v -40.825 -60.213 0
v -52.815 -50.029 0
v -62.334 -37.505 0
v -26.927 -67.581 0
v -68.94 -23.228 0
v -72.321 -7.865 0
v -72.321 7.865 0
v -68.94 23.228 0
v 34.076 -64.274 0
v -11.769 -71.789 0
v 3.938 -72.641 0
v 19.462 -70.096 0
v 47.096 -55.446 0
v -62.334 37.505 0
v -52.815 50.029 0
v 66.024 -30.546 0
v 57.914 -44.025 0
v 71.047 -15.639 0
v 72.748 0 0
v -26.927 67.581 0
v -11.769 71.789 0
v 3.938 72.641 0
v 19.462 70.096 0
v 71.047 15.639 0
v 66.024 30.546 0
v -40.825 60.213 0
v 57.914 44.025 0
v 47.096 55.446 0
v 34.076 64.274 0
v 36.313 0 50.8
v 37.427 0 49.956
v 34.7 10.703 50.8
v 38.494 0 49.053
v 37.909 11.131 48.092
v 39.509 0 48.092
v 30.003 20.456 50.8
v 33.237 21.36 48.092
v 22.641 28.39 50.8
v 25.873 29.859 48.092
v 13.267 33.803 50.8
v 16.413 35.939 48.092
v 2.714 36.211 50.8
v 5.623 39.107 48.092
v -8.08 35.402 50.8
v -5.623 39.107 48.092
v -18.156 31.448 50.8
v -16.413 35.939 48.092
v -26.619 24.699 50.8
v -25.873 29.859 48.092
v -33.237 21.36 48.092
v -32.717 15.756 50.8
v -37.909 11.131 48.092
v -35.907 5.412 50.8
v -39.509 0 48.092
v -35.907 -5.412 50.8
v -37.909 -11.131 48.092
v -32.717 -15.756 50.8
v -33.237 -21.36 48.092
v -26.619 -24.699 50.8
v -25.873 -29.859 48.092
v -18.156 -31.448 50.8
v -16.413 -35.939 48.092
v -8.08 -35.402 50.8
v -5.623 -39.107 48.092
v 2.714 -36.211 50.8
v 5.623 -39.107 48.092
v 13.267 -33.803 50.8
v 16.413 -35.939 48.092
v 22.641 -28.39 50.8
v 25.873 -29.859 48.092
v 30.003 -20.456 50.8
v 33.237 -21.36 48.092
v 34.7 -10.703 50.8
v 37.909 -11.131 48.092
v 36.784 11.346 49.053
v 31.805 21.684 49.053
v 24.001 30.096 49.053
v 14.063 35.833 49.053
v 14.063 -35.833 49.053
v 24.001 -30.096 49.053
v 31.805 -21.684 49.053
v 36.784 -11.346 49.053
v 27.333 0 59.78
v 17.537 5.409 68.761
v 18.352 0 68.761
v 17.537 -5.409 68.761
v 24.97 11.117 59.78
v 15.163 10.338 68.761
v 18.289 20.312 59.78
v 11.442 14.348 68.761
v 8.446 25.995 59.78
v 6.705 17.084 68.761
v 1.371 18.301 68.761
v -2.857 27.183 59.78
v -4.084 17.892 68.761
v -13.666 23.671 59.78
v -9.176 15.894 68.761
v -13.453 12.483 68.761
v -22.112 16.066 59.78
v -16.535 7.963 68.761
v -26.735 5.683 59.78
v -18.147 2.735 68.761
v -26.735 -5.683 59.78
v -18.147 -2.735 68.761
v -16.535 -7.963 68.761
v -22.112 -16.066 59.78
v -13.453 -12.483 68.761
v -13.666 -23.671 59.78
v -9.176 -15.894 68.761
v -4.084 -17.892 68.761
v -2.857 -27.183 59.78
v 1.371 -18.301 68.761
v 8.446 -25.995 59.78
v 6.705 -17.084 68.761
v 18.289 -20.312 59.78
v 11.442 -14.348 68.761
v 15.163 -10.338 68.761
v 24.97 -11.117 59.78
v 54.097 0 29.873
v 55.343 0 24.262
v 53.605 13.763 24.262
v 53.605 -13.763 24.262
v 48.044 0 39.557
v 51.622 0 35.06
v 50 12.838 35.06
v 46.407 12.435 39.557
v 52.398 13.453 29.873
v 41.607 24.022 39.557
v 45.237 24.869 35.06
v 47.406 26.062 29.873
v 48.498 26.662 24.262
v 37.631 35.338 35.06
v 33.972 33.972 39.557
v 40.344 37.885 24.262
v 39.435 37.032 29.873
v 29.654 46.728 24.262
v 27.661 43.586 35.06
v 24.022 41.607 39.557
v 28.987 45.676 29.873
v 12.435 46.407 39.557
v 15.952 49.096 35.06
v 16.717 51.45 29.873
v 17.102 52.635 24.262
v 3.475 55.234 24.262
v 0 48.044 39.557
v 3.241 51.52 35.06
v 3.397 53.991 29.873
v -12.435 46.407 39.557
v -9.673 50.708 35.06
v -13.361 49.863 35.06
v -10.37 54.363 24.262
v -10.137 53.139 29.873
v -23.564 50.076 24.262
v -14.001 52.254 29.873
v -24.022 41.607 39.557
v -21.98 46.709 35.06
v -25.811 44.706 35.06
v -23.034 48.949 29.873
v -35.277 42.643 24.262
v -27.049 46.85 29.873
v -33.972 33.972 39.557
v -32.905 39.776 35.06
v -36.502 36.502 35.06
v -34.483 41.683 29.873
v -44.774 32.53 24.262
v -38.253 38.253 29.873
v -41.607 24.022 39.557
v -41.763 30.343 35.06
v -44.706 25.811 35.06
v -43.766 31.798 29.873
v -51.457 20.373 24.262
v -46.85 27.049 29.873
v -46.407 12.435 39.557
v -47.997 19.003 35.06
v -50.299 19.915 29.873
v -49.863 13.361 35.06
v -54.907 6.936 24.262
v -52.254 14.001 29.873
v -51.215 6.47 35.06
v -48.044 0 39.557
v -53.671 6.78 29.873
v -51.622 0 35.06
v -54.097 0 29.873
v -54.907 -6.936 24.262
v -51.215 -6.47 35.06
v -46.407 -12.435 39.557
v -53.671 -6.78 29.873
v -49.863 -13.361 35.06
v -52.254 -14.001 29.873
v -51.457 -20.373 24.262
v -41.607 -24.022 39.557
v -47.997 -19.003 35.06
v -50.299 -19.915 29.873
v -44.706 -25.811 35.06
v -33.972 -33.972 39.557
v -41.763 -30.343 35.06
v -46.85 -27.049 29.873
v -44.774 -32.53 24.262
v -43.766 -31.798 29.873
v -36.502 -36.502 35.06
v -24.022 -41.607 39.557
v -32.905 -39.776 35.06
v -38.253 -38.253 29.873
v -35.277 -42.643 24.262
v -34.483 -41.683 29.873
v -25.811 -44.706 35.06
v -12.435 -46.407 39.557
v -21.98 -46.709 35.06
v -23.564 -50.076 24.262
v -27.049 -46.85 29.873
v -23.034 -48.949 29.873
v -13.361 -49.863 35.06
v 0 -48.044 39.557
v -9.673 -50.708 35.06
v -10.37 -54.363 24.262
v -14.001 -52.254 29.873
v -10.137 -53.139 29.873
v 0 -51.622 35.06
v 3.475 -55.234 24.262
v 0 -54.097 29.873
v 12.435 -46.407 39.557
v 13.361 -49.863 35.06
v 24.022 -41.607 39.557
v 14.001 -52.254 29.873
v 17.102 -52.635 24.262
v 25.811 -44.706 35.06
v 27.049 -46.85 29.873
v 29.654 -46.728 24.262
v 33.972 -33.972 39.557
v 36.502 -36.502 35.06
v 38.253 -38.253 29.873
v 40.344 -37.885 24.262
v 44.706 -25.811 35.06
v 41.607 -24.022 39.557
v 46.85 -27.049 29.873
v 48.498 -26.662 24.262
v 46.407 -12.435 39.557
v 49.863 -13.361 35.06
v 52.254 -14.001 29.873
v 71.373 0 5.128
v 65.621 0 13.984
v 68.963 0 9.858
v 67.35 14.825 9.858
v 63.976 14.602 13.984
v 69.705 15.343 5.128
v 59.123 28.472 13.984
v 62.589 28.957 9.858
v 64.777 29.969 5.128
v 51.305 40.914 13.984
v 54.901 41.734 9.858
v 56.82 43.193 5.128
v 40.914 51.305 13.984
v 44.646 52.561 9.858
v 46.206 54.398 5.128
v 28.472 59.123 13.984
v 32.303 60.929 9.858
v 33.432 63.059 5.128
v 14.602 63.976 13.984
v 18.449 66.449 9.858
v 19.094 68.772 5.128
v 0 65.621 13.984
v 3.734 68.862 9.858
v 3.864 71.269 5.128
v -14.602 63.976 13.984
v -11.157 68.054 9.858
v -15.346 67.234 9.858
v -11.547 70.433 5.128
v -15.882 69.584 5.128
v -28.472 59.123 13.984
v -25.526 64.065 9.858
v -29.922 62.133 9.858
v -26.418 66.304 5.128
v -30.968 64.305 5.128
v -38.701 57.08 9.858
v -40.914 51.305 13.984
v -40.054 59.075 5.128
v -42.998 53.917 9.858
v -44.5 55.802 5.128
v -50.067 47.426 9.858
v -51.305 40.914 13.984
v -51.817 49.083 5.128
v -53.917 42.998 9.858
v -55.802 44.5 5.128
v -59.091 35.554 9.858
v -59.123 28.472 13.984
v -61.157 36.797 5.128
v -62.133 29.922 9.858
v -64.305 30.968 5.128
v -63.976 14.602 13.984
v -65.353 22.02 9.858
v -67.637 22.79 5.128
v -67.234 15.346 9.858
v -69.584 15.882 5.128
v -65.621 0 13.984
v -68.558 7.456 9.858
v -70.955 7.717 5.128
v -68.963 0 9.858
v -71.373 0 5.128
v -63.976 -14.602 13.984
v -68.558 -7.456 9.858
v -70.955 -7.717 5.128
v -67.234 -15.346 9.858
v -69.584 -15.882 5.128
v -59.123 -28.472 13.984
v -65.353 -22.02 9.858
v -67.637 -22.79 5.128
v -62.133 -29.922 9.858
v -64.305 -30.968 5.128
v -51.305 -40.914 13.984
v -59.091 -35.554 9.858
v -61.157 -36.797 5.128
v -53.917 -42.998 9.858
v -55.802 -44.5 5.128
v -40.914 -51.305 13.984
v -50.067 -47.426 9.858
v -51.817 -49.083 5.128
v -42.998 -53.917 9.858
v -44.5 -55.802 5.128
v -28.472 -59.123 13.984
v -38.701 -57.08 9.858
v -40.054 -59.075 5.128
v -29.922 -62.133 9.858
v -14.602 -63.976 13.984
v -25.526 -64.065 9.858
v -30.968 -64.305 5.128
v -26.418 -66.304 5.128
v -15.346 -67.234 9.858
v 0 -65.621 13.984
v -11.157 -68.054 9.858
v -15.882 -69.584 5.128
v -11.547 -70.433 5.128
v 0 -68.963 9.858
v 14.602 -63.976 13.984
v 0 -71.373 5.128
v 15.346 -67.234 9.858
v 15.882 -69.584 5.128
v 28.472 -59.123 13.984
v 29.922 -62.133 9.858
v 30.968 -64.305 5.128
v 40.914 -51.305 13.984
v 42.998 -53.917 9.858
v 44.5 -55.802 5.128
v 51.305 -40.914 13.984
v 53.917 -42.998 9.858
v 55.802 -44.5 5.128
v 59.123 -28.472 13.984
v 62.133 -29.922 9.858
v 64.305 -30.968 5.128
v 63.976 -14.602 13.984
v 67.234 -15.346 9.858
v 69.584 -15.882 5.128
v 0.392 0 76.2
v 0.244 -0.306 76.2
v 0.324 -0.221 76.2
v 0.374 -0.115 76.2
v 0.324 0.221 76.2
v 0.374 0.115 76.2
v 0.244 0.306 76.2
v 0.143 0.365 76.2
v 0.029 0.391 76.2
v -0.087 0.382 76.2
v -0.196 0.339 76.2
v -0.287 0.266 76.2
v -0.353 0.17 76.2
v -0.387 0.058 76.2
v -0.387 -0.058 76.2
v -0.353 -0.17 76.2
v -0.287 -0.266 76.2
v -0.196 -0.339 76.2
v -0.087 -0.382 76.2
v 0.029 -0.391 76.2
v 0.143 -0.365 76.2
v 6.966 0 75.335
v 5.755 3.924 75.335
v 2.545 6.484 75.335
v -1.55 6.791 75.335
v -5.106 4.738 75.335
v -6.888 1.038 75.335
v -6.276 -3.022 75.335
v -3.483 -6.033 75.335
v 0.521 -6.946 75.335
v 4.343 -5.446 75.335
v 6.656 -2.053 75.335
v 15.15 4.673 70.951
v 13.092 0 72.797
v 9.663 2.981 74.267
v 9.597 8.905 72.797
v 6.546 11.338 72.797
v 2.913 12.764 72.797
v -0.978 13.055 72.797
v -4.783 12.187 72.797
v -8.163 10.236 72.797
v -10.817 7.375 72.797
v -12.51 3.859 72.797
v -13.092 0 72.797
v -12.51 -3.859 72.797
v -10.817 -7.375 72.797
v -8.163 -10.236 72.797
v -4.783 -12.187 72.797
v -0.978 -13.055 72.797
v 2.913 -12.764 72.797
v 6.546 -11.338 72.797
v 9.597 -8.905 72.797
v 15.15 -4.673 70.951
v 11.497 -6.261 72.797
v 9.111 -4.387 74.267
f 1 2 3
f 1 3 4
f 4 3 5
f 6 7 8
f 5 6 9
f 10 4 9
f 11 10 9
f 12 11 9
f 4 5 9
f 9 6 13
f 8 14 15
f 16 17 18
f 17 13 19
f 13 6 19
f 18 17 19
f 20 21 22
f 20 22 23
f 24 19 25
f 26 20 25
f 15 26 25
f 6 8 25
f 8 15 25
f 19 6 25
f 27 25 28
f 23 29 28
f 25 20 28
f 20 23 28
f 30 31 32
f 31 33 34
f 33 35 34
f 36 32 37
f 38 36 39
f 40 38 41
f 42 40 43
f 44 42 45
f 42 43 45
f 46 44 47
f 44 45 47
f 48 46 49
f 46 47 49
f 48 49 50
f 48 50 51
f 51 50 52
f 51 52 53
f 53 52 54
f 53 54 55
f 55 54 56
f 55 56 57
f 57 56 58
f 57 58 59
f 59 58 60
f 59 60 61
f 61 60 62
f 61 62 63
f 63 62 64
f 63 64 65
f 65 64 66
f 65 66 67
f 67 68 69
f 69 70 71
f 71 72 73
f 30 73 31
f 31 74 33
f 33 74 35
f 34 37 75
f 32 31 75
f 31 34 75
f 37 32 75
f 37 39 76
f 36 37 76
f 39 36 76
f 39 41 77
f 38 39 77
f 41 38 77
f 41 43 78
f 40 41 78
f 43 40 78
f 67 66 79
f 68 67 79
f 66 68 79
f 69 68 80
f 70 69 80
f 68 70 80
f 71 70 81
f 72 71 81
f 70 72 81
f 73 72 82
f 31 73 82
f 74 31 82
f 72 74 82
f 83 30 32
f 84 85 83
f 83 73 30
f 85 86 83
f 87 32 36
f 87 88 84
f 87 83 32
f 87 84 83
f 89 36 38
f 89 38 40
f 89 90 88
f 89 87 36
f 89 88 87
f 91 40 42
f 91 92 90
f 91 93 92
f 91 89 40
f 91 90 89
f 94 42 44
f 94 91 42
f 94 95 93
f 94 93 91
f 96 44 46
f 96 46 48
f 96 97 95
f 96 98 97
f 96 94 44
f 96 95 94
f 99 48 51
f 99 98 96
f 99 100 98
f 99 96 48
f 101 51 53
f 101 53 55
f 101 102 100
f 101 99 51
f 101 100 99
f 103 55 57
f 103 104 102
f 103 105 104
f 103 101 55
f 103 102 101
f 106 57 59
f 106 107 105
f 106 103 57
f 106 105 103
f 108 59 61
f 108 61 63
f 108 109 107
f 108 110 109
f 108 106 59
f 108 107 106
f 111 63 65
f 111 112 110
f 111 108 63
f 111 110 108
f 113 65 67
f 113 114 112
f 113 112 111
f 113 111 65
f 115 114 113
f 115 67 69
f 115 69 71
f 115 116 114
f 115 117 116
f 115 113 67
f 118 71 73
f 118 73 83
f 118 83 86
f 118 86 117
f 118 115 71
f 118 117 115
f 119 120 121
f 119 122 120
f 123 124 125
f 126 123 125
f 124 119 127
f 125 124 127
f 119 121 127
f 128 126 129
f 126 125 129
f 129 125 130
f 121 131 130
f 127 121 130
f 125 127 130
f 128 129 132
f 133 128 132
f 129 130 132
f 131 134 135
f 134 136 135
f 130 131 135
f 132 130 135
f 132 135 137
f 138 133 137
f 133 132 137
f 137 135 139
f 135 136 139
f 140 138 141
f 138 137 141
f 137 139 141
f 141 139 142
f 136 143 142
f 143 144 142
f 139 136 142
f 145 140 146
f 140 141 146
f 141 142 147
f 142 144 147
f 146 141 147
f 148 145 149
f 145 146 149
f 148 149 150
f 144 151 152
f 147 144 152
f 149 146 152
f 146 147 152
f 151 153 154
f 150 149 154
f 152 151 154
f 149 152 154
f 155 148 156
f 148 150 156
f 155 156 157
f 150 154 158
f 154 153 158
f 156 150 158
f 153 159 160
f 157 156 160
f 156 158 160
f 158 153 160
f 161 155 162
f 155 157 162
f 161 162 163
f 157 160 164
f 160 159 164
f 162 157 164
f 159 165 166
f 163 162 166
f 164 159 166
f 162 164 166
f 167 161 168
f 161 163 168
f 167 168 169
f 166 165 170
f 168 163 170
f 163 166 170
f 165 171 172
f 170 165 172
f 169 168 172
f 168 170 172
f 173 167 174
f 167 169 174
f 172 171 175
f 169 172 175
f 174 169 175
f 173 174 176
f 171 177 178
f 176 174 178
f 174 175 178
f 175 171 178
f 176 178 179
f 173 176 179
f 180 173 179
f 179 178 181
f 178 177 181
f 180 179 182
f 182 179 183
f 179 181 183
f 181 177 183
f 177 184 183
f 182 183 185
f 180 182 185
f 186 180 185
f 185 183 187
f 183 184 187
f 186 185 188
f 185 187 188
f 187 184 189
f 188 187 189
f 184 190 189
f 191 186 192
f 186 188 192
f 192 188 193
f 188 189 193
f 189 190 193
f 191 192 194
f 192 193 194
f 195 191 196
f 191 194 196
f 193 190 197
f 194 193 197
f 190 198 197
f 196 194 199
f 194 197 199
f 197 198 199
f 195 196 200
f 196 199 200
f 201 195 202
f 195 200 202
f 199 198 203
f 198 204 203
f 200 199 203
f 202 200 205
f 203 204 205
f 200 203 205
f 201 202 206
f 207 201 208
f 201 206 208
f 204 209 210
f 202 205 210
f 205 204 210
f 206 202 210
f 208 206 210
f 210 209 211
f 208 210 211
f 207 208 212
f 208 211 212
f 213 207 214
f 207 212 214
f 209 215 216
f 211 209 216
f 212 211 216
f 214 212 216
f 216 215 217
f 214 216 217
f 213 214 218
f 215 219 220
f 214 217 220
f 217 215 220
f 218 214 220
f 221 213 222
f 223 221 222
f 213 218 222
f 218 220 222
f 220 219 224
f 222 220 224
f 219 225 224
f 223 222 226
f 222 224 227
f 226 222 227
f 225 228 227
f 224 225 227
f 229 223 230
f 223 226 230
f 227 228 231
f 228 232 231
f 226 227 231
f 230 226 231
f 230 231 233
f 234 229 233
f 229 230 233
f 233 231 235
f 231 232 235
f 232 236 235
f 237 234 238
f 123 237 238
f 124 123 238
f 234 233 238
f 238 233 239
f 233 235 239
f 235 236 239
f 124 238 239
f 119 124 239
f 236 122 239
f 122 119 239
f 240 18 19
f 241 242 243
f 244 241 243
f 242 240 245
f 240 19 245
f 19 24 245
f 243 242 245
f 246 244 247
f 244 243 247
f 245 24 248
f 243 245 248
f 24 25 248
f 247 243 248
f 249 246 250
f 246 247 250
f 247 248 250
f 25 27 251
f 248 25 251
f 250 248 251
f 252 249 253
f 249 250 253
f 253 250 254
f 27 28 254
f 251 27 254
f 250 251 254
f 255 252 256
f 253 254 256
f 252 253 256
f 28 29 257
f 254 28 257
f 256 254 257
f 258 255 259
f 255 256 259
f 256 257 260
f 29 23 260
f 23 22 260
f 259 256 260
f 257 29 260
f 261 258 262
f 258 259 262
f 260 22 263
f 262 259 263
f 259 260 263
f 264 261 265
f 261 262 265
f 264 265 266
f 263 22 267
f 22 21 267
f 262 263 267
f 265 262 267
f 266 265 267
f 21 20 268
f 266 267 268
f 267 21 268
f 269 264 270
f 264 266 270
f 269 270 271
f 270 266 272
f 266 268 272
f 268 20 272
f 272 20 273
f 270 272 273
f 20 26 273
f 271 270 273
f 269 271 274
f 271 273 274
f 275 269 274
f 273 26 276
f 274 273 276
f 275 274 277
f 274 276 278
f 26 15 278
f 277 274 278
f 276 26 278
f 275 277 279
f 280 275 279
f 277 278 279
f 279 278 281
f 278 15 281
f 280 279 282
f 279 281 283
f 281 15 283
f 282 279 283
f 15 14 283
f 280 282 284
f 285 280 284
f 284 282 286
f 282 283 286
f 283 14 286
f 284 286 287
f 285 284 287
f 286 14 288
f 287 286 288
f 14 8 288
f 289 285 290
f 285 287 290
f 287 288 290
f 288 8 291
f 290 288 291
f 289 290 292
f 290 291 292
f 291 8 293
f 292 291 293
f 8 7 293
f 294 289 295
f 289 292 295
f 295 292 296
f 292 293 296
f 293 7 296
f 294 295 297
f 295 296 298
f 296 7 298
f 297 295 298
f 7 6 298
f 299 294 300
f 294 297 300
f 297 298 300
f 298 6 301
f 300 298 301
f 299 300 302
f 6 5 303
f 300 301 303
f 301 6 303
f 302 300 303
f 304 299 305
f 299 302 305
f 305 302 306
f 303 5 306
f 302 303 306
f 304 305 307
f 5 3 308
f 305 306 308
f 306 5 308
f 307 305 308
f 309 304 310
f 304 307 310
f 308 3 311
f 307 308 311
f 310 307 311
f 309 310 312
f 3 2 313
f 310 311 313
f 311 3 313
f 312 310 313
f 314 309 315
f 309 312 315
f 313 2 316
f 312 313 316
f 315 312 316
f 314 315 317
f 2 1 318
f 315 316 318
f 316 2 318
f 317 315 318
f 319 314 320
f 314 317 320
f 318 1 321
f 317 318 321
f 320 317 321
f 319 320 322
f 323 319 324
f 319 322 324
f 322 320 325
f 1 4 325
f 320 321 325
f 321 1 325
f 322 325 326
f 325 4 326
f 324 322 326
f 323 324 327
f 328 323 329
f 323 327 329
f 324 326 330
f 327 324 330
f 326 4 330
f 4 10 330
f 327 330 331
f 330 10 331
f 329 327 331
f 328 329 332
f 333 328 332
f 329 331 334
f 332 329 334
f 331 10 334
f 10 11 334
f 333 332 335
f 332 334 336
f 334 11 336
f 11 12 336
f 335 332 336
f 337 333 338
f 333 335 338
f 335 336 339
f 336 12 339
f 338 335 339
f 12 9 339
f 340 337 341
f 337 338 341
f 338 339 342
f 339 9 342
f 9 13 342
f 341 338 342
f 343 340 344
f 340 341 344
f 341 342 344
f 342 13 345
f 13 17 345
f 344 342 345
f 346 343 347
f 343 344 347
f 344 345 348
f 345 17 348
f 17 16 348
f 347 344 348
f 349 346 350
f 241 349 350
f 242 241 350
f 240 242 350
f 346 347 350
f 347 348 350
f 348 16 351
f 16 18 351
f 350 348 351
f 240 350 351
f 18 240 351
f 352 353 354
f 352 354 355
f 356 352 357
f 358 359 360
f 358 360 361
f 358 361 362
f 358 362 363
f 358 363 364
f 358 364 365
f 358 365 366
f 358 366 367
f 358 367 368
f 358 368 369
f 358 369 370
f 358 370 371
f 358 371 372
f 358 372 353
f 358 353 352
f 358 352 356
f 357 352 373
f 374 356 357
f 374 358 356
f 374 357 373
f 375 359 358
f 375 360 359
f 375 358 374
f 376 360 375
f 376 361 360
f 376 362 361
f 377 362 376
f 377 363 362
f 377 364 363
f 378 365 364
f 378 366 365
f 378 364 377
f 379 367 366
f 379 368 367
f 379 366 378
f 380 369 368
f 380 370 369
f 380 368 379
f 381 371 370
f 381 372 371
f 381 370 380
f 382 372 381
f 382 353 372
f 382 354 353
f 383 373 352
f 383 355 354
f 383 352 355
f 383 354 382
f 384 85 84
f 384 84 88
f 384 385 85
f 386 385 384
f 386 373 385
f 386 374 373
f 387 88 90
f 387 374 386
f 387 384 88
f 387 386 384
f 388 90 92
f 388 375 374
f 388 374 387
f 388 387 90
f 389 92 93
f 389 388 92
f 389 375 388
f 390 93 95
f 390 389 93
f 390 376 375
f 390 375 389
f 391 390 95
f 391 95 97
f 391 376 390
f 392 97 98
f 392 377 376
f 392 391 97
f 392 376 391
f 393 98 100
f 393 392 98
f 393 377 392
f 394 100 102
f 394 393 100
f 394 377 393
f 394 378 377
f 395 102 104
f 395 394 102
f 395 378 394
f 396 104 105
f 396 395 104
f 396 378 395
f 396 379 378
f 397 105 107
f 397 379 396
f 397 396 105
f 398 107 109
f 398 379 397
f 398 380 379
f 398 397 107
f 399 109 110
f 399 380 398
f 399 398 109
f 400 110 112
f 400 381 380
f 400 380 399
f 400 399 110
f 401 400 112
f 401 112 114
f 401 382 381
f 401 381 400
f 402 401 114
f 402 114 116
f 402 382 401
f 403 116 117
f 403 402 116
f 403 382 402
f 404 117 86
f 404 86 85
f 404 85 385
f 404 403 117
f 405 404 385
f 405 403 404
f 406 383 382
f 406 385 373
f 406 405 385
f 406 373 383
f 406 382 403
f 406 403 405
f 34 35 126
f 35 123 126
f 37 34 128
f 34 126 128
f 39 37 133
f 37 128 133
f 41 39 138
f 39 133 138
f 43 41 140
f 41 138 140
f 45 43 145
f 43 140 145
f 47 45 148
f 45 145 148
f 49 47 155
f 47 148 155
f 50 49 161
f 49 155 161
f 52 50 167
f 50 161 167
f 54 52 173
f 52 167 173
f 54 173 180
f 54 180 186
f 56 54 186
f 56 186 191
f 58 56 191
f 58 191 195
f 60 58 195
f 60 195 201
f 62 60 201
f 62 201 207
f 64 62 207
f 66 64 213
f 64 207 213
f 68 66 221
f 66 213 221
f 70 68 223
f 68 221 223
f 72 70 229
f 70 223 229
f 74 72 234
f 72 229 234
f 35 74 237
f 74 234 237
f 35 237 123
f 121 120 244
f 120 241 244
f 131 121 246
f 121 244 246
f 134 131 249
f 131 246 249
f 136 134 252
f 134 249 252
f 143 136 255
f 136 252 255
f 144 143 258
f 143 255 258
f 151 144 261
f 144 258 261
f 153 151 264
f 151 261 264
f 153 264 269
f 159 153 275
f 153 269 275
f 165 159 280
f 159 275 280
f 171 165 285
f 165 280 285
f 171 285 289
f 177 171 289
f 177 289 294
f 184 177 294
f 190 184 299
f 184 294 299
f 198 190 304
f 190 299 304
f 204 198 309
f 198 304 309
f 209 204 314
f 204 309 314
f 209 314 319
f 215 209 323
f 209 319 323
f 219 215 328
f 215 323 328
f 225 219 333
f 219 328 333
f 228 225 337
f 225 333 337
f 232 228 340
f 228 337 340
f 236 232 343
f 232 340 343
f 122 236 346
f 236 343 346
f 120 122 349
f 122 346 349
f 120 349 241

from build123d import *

# Parameters (mm, degrees)
F0_R        = 36.3127781595
F1_DEPTH    = 76.2
F0_R_2      = 55.3433829245
F2_DEPTH    = 50.8
F0_R_3      = 72.7478178249
F3_DEPTH    = 25.4
F4_SIZE     = 25.39999
F5_S5_R     = 55.3433829245
F5_T6_DEPTH = 105


# Not quite as in the source:
# - a fillet or chamfer that OpenCascade refuses, or shapes differently, is made with other operations: its cross-section is extruded or revolved along the edge and cut away or added
# - a fillet or chamfer is up to 0.001 mm smaller than in the source, because OpenCascade refuses the exact size


with BuildPart() as f1:
    # F0 (on Top) → F1 (new body)
    with BuildSketch(Plane.XY):
        Circle(F0_R)
    extrude(amount=F1_DEPTH)

    # F0 (on Top) → F2 (join)
    with BuildSketch(Plane.XY):
        Circle(F0_R_2)
        Circle(F0_R, mode=Mode.SUBTRACT)
    extrude(amount=F2_DEPTH)

    # F0 (on Top) → F3 (join)
    with BuildSketch(Plane.XY):
        Circle(F0_R_3)
        Circle(F0_R_2, mode=Mode.SUBTRACT)
    extrude(amount=F3_DEPTH)

    # F4 (size 25.4 in the source; OpenCascade refuses exactly that, so slightly less here)
    f4_edges = [f1.edges().sort_by_distance(p)[0] for p in [
        (-36.312778, 0, 76.2),
    ]]
    chamfer(f4_edges, length=F4_SIZE)

    # F5: chamfer of 18.542 on 2 edges, made by hand


with BuildPart() as f5_tool2:
    # F5_s3 → F5_t4 (revolve)
    with BuildSketch(Plane.XZ):
        Polygon((54.2058178249, 25.4), (72.7478178249, 6.858), (72.7478178249, 25.4), align=None)
    revolve(axis=Axis((0, 0, 25.4), (0, 0, 1)))

    # F5_s5 → F5_t6 (cut, symmetric)
    with BuildSketch(Plane.XY.offset(16.1)):
        Circle(F5_S5_R)
    extrude(amount=F5_T6_DEPTH, both=True, mode=Mode.SUBTRACT)


with BuildPart() as f1_1:
    add(f1.part)

    # F5_t1: cut F5_tool2
    add(f5_tool2.part, mode=Mode.SUBTRACT)

    # F5_s7 → F5_t8 (revolve, cut)
    with BuildSketch(Plane.XZ):
        Polygon((36.8013829245, 50.8), (55.3433829245, 32.258), (55.3433829245, 50.8), align=None)
    revolve(axis=Axis((0, 0, 50.8), (0, 0, 1)), mode=Mode.SUBTRACT)

    # F6: fillet of radius 25.4 on 4 edges, made by hand

    # F6_s1 → F6_t2 (revolve, cut)
    with BuildSketch(Plane.XZ):
        with BuildLine():
            ThreePointArc((18.3522759174, 68.7605122421), (10.1119228573, 74.2665401258), (0.3917636752, 76.2))
            Line((0.3917636752, 76.2), (0.3917636752, 76.708))
            Line((0.3917636752, 76.708), (11.1232086492, 76.708))
            Line((11.1232086492, 76.708), (18.7114861622, 69.119722487))
            Line((18.7114861622, 69.119722487), (18.3522759174, 68.7605122421))
        make_face()
    revolve(axis=Axis((0, 0, 76.2), (0, 0, 1)), mode=Mode.SUBTRACT)

    # F6_s3 → F6_t4 (revolve, cut)
    with BuildSketch(Plane.XZ):
        with BuildLine():
            ThreePointArc((48.0441667783, 39.5572161462), (53.0070025329, 32.5365446991), (55.3433829245, 24.2624349004))
            Line((55.3433829245, 24.2624349004), (55.8485774923, 24.3157495203))
            ThreePointArc((55.8485774923, 24.3157495203), (55.8513829245, 28.2602174502), (55.8513829245, 32.258))
            Line((55.8513829245, 32.258), (55.7025931693, 32.6172102448))
            Line((55.7025931693, 32.6172102448), (48.4033770231, 39.9164263911))
            Line((48.4033770231, 39.9164263911), (48.0441667783, 39.5572161462))
        make_face()
    revolve(axis=Axis((0, 0, 32.258), (0, 0, 1)), mode=Mode.SUBTRACT)

    # F6_s5 → F6_t6 (revolve, cut)
    with BuildSketch(Plane.XZ):
        with BuildLine():
            ThreePointArc((65.6214802199, 13.984337605), (70.2919041112, 7.5564195951), (72.7478178249, 0))
            Line((72.7478178249, 0), (73.2495548219, 0.0795234927))
            ThreePointArc((73.2495548219, 0.0795234927), (73.2558178249, 3.429), (73.2558178249, 6.858))
            Line((73.2558178249, 6.858), (73.1070280697, 7.2172102448))
            Line((73.1070280697, 7.2172102448), (65.9806904647, 14.3435478499))
            Line((65.9806904647, 14.3435478499), (65.6214802199, 13.984337605))
        make_face()
    revolve(axis=Axis((0, 0, 6.858), (0, 0, 1)), mode=Mode.SUBTRACT)

    # F6_s7 → F6_t8 (revolve, cut)
    with BuildSketch(Plane.XZ):
        with BuildLine():
            ThreePointArc((36.3127781595, 50.8), (37.9669911758, 49.5120321576), (39.5093522451, 48.0920306794))
            Line((39.5093522451, 48.0920306794), (39.86856249, 48.4512409242))
            Line((39.86856249, 48.4512409242), (37.1605931693, 51.1592102448))
            Line((37.1605931693, 51.1592102448), (36.8013829245, 51.308))
            ThreePointArc((36.8013829245, 51.308), (36.557080542, 51.308), (36.6080569226, 51.2133696313))
            Line((36.6080569226, 51.2133696313), (36.3127781595, 50.8))
        make_face()
    revolve(axis=Axis((0, 0, 50.8), (0, 0, 1)), mode=Mode.SUBTRACT)


solid = f1_1.part
